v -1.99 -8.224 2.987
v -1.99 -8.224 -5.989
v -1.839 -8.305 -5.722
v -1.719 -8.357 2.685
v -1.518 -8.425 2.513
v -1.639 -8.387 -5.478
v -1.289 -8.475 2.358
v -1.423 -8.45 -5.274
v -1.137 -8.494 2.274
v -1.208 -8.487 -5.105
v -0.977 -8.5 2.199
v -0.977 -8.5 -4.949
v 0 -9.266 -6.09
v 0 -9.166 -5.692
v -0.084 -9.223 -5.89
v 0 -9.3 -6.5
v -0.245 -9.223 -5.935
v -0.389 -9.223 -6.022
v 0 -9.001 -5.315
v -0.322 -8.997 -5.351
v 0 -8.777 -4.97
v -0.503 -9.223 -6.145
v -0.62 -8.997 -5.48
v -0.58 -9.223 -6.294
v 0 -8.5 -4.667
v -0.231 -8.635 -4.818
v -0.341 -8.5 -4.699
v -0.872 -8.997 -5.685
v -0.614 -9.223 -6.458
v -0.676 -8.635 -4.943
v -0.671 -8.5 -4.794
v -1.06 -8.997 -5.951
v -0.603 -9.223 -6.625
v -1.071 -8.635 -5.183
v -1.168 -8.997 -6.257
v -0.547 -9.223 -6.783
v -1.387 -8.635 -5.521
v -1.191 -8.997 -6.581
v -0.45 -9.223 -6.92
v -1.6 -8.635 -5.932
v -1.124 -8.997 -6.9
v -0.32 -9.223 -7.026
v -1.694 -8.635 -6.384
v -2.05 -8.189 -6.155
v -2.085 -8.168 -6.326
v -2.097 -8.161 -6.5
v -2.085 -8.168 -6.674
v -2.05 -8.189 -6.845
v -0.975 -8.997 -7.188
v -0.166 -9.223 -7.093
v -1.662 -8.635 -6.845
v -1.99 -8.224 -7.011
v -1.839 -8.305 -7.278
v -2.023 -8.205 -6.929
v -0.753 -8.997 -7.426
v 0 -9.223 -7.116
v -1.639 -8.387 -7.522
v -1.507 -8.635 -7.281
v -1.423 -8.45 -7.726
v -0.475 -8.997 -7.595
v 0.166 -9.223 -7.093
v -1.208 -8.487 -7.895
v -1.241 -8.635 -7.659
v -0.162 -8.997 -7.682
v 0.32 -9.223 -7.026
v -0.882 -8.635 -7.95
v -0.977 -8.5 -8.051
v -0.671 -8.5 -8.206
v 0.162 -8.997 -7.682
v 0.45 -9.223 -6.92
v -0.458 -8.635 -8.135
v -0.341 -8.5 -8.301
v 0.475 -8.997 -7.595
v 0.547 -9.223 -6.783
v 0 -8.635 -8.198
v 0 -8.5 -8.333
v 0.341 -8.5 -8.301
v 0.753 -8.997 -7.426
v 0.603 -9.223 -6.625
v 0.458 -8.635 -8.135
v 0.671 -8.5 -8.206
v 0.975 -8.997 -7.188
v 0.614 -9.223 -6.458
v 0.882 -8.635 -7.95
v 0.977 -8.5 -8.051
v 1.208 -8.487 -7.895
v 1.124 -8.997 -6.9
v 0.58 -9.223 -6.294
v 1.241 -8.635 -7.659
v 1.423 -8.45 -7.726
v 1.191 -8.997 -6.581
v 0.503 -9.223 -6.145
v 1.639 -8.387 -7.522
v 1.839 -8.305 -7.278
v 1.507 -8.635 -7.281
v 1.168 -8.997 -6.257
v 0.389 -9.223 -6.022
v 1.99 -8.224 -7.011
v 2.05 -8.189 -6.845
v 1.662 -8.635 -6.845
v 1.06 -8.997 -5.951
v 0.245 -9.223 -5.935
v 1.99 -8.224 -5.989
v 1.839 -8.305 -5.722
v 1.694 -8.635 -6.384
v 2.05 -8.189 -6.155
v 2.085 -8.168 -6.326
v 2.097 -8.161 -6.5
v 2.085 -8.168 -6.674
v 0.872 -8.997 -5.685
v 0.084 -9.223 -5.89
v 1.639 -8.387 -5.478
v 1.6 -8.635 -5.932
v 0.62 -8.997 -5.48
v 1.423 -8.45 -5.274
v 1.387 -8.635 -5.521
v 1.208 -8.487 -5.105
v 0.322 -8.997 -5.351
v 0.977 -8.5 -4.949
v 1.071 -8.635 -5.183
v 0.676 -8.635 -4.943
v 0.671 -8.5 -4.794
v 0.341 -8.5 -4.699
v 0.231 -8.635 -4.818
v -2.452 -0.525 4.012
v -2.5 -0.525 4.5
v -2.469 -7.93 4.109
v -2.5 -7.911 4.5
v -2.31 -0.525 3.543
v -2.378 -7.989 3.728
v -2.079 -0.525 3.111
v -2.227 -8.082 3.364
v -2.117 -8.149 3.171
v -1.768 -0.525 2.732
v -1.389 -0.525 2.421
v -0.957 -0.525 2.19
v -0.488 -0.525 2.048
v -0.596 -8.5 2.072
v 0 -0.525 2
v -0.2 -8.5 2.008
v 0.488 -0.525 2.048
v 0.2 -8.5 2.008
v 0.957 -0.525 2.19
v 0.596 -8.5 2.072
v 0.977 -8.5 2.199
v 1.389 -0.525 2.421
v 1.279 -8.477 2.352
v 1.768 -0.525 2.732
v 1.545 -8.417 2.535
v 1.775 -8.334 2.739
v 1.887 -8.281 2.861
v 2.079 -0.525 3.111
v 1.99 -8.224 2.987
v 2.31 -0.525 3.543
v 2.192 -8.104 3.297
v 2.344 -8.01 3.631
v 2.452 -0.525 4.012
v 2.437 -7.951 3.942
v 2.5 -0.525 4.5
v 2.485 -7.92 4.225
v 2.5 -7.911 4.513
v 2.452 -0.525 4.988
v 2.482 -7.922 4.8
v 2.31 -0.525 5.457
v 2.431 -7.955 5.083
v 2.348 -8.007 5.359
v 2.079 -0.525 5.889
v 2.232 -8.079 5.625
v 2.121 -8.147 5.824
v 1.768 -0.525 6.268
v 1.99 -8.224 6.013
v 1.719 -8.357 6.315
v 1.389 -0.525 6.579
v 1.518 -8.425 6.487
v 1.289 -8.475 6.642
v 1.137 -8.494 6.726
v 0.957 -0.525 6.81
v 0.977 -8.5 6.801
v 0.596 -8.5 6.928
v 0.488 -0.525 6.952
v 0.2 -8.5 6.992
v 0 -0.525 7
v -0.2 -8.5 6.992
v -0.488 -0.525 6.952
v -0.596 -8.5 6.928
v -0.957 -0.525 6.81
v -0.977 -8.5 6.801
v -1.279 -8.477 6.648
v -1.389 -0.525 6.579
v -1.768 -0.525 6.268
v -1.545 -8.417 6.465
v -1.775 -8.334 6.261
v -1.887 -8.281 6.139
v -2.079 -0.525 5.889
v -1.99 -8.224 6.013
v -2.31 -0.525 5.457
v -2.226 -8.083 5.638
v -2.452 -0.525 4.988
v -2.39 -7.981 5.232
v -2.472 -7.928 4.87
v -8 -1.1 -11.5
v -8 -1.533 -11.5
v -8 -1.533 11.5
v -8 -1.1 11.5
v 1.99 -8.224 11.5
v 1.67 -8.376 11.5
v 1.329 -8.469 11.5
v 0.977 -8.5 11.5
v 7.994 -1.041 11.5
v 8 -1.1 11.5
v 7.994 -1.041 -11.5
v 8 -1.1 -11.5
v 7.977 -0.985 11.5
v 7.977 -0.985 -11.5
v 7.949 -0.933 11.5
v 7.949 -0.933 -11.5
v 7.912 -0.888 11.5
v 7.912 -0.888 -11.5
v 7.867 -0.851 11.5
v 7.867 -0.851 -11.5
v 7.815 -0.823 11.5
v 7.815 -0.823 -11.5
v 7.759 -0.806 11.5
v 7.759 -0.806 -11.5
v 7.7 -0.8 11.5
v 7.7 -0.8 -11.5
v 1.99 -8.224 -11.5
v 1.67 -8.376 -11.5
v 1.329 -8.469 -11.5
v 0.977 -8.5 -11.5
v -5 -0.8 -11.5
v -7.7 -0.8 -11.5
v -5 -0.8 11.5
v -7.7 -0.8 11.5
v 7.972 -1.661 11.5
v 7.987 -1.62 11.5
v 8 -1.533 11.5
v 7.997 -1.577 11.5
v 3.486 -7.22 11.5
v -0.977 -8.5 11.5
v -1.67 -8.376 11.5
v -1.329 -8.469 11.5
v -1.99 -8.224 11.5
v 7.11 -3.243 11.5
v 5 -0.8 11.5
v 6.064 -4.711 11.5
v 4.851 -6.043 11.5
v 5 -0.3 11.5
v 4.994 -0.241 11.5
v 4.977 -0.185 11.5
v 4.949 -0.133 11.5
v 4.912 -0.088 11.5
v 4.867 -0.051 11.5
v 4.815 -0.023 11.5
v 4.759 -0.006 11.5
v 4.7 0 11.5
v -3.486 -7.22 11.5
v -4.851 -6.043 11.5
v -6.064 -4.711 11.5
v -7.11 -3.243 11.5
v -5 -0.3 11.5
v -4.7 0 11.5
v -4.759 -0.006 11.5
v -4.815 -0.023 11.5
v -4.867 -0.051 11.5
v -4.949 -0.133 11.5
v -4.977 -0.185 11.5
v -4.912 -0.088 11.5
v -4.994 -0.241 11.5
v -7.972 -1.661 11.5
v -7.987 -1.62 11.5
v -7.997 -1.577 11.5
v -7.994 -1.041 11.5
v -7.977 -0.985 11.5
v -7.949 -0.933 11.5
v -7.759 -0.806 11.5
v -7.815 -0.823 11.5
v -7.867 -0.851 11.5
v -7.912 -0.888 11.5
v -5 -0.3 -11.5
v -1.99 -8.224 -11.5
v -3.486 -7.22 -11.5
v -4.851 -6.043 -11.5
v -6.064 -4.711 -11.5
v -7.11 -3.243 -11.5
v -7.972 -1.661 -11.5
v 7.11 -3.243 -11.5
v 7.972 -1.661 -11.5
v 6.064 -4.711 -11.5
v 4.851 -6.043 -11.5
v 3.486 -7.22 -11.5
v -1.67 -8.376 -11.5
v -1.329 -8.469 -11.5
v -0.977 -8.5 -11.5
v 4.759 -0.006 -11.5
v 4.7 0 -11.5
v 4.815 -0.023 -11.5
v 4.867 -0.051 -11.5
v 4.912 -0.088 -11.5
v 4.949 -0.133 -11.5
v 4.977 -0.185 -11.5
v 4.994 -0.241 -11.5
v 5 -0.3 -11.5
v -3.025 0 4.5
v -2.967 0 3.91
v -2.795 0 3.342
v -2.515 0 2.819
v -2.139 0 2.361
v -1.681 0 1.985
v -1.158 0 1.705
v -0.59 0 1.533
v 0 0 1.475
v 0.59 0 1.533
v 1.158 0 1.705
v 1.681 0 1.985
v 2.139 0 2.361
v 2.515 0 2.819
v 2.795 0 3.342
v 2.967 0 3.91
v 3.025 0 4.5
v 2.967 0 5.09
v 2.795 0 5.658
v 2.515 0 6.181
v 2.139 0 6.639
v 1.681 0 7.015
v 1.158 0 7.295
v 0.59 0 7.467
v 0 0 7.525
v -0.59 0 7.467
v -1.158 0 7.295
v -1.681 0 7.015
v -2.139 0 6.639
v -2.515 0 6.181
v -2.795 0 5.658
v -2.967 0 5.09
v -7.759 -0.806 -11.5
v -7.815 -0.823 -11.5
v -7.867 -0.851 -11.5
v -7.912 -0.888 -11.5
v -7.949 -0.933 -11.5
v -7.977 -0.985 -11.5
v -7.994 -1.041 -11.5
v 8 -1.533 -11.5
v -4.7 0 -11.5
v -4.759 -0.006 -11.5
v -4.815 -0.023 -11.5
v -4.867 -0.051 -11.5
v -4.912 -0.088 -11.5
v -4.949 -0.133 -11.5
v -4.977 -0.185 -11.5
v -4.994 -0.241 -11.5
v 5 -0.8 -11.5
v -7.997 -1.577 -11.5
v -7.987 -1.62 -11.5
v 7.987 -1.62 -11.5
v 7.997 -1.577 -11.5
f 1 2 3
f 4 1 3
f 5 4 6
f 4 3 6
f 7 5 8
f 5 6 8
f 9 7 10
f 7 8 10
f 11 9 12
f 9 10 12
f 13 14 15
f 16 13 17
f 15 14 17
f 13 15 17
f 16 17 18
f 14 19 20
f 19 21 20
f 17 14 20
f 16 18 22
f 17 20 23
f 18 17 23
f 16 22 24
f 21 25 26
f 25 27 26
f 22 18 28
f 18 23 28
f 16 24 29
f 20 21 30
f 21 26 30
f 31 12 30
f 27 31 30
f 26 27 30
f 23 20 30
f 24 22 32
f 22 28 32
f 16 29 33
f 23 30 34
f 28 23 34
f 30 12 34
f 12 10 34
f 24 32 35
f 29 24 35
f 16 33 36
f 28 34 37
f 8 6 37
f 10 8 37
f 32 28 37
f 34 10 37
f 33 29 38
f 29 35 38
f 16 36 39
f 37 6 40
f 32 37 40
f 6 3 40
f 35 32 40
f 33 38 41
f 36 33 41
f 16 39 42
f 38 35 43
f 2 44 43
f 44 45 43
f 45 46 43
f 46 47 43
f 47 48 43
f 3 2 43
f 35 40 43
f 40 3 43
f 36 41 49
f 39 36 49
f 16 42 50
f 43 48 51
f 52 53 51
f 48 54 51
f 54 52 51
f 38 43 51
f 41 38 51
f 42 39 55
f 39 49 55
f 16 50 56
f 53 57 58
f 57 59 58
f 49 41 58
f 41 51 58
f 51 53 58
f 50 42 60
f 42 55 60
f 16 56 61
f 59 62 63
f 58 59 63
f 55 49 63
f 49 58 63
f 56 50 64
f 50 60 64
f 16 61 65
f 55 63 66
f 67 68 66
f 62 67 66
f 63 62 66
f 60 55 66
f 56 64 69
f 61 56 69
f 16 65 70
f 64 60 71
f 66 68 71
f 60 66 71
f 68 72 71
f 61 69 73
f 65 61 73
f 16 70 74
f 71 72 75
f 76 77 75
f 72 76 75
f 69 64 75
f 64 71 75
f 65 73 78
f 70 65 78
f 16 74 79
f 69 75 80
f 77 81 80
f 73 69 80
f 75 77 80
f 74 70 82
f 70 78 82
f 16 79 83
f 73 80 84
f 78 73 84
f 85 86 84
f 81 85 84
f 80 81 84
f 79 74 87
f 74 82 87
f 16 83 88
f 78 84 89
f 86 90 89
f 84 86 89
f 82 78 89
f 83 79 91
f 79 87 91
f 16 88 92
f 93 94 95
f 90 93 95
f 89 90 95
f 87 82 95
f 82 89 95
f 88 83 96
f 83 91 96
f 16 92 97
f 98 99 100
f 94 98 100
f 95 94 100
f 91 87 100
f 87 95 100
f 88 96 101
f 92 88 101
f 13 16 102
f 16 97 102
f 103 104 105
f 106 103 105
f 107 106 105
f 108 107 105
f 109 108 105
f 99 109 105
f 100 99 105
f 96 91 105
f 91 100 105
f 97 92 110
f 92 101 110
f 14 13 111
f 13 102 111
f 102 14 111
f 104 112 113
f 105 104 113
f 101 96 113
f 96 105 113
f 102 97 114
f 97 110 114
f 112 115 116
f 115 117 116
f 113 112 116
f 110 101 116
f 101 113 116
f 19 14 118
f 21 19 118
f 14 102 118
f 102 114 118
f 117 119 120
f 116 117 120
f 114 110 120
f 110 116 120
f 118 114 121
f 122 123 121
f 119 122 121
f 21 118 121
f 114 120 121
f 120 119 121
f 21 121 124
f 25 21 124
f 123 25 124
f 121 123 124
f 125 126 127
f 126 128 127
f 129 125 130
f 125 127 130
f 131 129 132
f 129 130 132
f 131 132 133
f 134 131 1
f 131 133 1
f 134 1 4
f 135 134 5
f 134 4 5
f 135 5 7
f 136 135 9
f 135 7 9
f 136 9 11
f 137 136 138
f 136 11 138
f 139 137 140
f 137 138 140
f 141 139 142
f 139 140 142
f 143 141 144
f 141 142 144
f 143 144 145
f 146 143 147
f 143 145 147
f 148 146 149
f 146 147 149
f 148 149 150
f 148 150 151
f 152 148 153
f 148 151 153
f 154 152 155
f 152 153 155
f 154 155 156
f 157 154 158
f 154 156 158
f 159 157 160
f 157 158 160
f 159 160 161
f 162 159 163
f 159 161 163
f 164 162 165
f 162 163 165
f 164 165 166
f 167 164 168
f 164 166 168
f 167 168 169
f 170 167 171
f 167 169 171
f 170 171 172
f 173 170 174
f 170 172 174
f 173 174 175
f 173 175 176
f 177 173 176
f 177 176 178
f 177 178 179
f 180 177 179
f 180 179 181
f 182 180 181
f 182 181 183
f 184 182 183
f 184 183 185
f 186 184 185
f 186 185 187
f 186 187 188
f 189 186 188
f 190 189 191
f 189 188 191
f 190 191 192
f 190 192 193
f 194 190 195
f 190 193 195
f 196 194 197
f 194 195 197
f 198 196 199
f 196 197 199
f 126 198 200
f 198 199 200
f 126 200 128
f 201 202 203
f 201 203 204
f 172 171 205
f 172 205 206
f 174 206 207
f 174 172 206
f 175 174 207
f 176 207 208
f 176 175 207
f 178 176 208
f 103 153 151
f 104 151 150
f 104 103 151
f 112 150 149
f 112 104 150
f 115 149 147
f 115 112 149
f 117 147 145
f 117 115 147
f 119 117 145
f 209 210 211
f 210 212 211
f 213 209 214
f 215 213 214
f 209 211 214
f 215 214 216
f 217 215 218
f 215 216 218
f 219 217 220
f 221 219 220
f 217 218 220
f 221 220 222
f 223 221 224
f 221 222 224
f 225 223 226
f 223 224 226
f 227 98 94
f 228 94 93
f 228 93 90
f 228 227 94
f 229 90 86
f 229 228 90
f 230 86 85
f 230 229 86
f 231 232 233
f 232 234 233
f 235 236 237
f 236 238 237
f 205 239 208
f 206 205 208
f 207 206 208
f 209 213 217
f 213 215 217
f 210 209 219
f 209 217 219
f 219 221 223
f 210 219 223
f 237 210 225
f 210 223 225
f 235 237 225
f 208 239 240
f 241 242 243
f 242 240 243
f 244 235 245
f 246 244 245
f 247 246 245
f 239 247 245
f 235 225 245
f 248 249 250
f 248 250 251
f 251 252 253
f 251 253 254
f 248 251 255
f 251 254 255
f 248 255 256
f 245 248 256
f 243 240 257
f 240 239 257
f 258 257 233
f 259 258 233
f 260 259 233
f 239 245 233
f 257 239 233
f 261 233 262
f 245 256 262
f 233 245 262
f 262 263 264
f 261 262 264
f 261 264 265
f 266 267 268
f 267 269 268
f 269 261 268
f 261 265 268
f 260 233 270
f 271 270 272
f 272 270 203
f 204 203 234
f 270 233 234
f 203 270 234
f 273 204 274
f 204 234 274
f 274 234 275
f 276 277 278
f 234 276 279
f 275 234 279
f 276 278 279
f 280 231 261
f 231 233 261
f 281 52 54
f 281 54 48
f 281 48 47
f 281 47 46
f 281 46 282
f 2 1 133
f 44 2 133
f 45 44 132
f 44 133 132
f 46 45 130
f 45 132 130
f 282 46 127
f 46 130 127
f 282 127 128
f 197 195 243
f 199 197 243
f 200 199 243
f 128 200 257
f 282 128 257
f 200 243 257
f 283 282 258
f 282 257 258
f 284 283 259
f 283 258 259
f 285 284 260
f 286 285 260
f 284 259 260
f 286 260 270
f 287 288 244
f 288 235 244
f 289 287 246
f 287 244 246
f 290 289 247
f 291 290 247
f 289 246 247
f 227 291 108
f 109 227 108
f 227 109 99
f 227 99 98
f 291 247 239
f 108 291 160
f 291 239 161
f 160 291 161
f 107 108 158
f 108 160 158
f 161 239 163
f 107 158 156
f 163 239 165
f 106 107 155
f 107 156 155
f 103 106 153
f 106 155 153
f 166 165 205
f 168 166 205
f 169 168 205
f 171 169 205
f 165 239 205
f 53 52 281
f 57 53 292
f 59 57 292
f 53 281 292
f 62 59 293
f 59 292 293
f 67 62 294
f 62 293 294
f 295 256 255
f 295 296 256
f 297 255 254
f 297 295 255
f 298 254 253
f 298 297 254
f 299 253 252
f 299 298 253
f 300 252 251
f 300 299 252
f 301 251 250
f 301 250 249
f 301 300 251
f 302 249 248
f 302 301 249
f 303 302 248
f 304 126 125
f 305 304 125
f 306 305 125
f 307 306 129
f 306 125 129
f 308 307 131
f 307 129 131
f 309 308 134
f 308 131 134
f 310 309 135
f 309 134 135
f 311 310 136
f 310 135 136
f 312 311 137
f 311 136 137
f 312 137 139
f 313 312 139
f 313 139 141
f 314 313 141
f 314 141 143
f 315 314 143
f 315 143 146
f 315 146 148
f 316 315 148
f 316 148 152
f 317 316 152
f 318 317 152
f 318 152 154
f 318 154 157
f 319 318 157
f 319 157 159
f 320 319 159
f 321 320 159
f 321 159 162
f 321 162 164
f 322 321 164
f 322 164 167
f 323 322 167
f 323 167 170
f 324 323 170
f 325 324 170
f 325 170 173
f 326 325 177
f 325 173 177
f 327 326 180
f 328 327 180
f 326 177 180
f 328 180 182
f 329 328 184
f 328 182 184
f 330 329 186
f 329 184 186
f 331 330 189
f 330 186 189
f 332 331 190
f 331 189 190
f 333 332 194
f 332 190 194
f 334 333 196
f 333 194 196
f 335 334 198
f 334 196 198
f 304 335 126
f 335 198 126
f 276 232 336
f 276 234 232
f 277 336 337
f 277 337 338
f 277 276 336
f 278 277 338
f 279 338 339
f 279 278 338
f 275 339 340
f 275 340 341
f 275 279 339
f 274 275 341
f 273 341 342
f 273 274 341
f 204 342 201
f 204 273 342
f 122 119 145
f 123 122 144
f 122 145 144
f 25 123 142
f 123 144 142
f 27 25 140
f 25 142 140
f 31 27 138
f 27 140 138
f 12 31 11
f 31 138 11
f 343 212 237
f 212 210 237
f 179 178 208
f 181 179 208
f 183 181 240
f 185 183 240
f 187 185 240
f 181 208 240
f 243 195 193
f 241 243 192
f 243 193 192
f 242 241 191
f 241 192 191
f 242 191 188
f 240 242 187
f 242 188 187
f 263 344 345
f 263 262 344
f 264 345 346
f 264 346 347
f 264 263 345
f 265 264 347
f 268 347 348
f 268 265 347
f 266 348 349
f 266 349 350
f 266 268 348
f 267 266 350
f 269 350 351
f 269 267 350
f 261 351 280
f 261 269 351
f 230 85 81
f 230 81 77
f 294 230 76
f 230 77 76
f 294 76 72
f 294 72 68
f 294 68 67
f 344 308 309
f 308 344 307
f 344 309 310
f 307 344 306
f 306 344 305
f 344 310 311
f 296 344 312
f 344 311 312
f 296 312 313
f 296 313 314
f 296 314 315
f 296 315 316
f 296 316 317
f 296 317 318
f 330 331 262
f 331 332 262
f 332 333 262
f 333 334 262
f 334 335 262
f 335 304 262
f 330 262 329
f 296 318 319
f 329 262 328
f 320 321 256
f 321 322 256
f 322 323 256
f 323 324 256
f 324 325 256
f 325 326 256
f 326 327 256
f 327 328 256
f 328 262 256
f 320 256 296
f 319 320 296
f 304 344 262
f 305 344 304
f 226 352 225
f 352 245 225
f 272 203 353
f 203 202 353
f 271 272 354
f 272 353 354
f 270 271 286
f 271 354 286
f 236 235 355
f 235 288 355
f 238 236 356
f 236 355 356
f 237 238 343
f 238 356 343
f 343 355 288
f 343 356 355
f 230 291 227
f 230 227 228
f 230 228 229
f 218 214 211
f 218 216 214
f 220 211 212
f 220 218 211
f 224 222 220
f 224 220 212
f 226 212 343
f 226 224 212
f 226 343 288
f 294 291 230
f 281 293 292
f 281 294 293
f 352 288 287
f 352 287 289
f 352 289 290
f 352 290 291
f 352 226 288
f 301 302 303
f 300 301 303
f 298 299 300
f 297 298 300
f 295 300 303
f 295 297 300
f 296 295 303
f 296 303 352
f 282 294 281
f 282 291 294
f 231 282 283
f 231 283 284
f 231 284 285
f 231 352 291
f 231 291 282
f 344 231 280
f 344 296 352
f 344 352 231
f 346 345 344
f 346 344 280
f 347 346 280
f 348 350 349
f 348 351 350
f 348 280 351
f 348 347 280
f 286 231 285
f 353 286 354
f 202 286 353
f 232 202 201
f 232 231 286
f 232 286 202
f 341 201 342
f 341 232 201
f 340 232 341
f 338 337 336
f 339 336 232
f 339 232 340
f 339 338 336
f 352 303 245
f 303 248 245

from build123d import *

# Parameters (mm, degrees)
EXTRUDE_1_DEPTH             = 11.5
FILLET_1_R                  = 0.3
FILLET_2_R                  = 2
HOLE_WIZARD_M63_D           = 5
HOLE_WIZARD_M63_CSINK_D     = 6.05
HOLE_WIZARD_M63_CSINK_ANGLE = 90


with BuildPart() as part:
    # Эскиз1 → Бобышка-Вытянуть1 (new body, symmetric)
    with BuildSketch(Plane.XY):
        with BuildLine():
            Line((-5, 0), (5, 0))
            Line((5, 0), (5, -0.8))
            Line((5, -0.8), (8, -0.8))
            Line((8, -0.8), (8, -1.6))
            ThreePointArc((8, -1.6), (5.309398779, -5.576969864), (1.5, -8.5))
            Line((1.5, -8.5), (-1.5, -8.5))
            ThreePointArc((-1.5, -8.5), (-5.309398779, -5.576969864), (-8, -1.6))
            Line((-8, -1.6), (-8, -0.8))
            Line((-8, -0.8), (-5, -0.8))
            Line((-5, -0.8), (-5, 0))
        make_face()
    extrude(amount=EXTRUDE_1_DEPTH, both=True)

    # Скругление1
    fillet_1_edges = [part.edges().sort_by_distance(p)[0] for p in [
        (8, -0.8, 0),
        (8, -1.6, 0),
        (-8, -1.6, 0),
        (-8, -0.8, 0),
        (-5, 0, 0),
        (5, 0, 0),
    ]]
    fillet(fillet_1_edges, radius=FILLET_1_R)

    # Скругление2
    fillet_2_edges = [part.edges().sort_by_distance(p)[0] for p in [
        (1.5, -8.5, 0),
        (-1.5, -8.5, 0),
    ]]
    fillet(fillet_2_edges, radius=FILLET_2_R)

    # Отверстие обработанное метчиком M63 (through all)
    with Locations(Plane(origin=(0, 0, 0), x_dir=(1, 0, 0), z_dir=(0, 1, 0))):
        with Locations((0, -4.5)):
            CounterSinkHole(HOLE_WIZARD_M63_D / 2, HOLE_WIZARD_M63_CSINK_D / 2, counter_sink_angle=HOLE_WIZARD_M63_CSINK_ANGLE)

    # Эскиз5 → Повернуть1 (revolve)
    with BuildSketch(Plane(origin=(0, 0, 0), x_dir=(0, 0, -1), z_dir=(1, 0, 0))):
        with BuildLine():
            Line((6.5, -4.3), (6.5, -9.3))
            ThreePointArc((6.5, -9.3), (4, -6.8), (6.5, -4.3))
        make_face()
    revolve(axis=Axis((0, -4.3, -6.5), (0, -1, 0)))


solid = part.part
